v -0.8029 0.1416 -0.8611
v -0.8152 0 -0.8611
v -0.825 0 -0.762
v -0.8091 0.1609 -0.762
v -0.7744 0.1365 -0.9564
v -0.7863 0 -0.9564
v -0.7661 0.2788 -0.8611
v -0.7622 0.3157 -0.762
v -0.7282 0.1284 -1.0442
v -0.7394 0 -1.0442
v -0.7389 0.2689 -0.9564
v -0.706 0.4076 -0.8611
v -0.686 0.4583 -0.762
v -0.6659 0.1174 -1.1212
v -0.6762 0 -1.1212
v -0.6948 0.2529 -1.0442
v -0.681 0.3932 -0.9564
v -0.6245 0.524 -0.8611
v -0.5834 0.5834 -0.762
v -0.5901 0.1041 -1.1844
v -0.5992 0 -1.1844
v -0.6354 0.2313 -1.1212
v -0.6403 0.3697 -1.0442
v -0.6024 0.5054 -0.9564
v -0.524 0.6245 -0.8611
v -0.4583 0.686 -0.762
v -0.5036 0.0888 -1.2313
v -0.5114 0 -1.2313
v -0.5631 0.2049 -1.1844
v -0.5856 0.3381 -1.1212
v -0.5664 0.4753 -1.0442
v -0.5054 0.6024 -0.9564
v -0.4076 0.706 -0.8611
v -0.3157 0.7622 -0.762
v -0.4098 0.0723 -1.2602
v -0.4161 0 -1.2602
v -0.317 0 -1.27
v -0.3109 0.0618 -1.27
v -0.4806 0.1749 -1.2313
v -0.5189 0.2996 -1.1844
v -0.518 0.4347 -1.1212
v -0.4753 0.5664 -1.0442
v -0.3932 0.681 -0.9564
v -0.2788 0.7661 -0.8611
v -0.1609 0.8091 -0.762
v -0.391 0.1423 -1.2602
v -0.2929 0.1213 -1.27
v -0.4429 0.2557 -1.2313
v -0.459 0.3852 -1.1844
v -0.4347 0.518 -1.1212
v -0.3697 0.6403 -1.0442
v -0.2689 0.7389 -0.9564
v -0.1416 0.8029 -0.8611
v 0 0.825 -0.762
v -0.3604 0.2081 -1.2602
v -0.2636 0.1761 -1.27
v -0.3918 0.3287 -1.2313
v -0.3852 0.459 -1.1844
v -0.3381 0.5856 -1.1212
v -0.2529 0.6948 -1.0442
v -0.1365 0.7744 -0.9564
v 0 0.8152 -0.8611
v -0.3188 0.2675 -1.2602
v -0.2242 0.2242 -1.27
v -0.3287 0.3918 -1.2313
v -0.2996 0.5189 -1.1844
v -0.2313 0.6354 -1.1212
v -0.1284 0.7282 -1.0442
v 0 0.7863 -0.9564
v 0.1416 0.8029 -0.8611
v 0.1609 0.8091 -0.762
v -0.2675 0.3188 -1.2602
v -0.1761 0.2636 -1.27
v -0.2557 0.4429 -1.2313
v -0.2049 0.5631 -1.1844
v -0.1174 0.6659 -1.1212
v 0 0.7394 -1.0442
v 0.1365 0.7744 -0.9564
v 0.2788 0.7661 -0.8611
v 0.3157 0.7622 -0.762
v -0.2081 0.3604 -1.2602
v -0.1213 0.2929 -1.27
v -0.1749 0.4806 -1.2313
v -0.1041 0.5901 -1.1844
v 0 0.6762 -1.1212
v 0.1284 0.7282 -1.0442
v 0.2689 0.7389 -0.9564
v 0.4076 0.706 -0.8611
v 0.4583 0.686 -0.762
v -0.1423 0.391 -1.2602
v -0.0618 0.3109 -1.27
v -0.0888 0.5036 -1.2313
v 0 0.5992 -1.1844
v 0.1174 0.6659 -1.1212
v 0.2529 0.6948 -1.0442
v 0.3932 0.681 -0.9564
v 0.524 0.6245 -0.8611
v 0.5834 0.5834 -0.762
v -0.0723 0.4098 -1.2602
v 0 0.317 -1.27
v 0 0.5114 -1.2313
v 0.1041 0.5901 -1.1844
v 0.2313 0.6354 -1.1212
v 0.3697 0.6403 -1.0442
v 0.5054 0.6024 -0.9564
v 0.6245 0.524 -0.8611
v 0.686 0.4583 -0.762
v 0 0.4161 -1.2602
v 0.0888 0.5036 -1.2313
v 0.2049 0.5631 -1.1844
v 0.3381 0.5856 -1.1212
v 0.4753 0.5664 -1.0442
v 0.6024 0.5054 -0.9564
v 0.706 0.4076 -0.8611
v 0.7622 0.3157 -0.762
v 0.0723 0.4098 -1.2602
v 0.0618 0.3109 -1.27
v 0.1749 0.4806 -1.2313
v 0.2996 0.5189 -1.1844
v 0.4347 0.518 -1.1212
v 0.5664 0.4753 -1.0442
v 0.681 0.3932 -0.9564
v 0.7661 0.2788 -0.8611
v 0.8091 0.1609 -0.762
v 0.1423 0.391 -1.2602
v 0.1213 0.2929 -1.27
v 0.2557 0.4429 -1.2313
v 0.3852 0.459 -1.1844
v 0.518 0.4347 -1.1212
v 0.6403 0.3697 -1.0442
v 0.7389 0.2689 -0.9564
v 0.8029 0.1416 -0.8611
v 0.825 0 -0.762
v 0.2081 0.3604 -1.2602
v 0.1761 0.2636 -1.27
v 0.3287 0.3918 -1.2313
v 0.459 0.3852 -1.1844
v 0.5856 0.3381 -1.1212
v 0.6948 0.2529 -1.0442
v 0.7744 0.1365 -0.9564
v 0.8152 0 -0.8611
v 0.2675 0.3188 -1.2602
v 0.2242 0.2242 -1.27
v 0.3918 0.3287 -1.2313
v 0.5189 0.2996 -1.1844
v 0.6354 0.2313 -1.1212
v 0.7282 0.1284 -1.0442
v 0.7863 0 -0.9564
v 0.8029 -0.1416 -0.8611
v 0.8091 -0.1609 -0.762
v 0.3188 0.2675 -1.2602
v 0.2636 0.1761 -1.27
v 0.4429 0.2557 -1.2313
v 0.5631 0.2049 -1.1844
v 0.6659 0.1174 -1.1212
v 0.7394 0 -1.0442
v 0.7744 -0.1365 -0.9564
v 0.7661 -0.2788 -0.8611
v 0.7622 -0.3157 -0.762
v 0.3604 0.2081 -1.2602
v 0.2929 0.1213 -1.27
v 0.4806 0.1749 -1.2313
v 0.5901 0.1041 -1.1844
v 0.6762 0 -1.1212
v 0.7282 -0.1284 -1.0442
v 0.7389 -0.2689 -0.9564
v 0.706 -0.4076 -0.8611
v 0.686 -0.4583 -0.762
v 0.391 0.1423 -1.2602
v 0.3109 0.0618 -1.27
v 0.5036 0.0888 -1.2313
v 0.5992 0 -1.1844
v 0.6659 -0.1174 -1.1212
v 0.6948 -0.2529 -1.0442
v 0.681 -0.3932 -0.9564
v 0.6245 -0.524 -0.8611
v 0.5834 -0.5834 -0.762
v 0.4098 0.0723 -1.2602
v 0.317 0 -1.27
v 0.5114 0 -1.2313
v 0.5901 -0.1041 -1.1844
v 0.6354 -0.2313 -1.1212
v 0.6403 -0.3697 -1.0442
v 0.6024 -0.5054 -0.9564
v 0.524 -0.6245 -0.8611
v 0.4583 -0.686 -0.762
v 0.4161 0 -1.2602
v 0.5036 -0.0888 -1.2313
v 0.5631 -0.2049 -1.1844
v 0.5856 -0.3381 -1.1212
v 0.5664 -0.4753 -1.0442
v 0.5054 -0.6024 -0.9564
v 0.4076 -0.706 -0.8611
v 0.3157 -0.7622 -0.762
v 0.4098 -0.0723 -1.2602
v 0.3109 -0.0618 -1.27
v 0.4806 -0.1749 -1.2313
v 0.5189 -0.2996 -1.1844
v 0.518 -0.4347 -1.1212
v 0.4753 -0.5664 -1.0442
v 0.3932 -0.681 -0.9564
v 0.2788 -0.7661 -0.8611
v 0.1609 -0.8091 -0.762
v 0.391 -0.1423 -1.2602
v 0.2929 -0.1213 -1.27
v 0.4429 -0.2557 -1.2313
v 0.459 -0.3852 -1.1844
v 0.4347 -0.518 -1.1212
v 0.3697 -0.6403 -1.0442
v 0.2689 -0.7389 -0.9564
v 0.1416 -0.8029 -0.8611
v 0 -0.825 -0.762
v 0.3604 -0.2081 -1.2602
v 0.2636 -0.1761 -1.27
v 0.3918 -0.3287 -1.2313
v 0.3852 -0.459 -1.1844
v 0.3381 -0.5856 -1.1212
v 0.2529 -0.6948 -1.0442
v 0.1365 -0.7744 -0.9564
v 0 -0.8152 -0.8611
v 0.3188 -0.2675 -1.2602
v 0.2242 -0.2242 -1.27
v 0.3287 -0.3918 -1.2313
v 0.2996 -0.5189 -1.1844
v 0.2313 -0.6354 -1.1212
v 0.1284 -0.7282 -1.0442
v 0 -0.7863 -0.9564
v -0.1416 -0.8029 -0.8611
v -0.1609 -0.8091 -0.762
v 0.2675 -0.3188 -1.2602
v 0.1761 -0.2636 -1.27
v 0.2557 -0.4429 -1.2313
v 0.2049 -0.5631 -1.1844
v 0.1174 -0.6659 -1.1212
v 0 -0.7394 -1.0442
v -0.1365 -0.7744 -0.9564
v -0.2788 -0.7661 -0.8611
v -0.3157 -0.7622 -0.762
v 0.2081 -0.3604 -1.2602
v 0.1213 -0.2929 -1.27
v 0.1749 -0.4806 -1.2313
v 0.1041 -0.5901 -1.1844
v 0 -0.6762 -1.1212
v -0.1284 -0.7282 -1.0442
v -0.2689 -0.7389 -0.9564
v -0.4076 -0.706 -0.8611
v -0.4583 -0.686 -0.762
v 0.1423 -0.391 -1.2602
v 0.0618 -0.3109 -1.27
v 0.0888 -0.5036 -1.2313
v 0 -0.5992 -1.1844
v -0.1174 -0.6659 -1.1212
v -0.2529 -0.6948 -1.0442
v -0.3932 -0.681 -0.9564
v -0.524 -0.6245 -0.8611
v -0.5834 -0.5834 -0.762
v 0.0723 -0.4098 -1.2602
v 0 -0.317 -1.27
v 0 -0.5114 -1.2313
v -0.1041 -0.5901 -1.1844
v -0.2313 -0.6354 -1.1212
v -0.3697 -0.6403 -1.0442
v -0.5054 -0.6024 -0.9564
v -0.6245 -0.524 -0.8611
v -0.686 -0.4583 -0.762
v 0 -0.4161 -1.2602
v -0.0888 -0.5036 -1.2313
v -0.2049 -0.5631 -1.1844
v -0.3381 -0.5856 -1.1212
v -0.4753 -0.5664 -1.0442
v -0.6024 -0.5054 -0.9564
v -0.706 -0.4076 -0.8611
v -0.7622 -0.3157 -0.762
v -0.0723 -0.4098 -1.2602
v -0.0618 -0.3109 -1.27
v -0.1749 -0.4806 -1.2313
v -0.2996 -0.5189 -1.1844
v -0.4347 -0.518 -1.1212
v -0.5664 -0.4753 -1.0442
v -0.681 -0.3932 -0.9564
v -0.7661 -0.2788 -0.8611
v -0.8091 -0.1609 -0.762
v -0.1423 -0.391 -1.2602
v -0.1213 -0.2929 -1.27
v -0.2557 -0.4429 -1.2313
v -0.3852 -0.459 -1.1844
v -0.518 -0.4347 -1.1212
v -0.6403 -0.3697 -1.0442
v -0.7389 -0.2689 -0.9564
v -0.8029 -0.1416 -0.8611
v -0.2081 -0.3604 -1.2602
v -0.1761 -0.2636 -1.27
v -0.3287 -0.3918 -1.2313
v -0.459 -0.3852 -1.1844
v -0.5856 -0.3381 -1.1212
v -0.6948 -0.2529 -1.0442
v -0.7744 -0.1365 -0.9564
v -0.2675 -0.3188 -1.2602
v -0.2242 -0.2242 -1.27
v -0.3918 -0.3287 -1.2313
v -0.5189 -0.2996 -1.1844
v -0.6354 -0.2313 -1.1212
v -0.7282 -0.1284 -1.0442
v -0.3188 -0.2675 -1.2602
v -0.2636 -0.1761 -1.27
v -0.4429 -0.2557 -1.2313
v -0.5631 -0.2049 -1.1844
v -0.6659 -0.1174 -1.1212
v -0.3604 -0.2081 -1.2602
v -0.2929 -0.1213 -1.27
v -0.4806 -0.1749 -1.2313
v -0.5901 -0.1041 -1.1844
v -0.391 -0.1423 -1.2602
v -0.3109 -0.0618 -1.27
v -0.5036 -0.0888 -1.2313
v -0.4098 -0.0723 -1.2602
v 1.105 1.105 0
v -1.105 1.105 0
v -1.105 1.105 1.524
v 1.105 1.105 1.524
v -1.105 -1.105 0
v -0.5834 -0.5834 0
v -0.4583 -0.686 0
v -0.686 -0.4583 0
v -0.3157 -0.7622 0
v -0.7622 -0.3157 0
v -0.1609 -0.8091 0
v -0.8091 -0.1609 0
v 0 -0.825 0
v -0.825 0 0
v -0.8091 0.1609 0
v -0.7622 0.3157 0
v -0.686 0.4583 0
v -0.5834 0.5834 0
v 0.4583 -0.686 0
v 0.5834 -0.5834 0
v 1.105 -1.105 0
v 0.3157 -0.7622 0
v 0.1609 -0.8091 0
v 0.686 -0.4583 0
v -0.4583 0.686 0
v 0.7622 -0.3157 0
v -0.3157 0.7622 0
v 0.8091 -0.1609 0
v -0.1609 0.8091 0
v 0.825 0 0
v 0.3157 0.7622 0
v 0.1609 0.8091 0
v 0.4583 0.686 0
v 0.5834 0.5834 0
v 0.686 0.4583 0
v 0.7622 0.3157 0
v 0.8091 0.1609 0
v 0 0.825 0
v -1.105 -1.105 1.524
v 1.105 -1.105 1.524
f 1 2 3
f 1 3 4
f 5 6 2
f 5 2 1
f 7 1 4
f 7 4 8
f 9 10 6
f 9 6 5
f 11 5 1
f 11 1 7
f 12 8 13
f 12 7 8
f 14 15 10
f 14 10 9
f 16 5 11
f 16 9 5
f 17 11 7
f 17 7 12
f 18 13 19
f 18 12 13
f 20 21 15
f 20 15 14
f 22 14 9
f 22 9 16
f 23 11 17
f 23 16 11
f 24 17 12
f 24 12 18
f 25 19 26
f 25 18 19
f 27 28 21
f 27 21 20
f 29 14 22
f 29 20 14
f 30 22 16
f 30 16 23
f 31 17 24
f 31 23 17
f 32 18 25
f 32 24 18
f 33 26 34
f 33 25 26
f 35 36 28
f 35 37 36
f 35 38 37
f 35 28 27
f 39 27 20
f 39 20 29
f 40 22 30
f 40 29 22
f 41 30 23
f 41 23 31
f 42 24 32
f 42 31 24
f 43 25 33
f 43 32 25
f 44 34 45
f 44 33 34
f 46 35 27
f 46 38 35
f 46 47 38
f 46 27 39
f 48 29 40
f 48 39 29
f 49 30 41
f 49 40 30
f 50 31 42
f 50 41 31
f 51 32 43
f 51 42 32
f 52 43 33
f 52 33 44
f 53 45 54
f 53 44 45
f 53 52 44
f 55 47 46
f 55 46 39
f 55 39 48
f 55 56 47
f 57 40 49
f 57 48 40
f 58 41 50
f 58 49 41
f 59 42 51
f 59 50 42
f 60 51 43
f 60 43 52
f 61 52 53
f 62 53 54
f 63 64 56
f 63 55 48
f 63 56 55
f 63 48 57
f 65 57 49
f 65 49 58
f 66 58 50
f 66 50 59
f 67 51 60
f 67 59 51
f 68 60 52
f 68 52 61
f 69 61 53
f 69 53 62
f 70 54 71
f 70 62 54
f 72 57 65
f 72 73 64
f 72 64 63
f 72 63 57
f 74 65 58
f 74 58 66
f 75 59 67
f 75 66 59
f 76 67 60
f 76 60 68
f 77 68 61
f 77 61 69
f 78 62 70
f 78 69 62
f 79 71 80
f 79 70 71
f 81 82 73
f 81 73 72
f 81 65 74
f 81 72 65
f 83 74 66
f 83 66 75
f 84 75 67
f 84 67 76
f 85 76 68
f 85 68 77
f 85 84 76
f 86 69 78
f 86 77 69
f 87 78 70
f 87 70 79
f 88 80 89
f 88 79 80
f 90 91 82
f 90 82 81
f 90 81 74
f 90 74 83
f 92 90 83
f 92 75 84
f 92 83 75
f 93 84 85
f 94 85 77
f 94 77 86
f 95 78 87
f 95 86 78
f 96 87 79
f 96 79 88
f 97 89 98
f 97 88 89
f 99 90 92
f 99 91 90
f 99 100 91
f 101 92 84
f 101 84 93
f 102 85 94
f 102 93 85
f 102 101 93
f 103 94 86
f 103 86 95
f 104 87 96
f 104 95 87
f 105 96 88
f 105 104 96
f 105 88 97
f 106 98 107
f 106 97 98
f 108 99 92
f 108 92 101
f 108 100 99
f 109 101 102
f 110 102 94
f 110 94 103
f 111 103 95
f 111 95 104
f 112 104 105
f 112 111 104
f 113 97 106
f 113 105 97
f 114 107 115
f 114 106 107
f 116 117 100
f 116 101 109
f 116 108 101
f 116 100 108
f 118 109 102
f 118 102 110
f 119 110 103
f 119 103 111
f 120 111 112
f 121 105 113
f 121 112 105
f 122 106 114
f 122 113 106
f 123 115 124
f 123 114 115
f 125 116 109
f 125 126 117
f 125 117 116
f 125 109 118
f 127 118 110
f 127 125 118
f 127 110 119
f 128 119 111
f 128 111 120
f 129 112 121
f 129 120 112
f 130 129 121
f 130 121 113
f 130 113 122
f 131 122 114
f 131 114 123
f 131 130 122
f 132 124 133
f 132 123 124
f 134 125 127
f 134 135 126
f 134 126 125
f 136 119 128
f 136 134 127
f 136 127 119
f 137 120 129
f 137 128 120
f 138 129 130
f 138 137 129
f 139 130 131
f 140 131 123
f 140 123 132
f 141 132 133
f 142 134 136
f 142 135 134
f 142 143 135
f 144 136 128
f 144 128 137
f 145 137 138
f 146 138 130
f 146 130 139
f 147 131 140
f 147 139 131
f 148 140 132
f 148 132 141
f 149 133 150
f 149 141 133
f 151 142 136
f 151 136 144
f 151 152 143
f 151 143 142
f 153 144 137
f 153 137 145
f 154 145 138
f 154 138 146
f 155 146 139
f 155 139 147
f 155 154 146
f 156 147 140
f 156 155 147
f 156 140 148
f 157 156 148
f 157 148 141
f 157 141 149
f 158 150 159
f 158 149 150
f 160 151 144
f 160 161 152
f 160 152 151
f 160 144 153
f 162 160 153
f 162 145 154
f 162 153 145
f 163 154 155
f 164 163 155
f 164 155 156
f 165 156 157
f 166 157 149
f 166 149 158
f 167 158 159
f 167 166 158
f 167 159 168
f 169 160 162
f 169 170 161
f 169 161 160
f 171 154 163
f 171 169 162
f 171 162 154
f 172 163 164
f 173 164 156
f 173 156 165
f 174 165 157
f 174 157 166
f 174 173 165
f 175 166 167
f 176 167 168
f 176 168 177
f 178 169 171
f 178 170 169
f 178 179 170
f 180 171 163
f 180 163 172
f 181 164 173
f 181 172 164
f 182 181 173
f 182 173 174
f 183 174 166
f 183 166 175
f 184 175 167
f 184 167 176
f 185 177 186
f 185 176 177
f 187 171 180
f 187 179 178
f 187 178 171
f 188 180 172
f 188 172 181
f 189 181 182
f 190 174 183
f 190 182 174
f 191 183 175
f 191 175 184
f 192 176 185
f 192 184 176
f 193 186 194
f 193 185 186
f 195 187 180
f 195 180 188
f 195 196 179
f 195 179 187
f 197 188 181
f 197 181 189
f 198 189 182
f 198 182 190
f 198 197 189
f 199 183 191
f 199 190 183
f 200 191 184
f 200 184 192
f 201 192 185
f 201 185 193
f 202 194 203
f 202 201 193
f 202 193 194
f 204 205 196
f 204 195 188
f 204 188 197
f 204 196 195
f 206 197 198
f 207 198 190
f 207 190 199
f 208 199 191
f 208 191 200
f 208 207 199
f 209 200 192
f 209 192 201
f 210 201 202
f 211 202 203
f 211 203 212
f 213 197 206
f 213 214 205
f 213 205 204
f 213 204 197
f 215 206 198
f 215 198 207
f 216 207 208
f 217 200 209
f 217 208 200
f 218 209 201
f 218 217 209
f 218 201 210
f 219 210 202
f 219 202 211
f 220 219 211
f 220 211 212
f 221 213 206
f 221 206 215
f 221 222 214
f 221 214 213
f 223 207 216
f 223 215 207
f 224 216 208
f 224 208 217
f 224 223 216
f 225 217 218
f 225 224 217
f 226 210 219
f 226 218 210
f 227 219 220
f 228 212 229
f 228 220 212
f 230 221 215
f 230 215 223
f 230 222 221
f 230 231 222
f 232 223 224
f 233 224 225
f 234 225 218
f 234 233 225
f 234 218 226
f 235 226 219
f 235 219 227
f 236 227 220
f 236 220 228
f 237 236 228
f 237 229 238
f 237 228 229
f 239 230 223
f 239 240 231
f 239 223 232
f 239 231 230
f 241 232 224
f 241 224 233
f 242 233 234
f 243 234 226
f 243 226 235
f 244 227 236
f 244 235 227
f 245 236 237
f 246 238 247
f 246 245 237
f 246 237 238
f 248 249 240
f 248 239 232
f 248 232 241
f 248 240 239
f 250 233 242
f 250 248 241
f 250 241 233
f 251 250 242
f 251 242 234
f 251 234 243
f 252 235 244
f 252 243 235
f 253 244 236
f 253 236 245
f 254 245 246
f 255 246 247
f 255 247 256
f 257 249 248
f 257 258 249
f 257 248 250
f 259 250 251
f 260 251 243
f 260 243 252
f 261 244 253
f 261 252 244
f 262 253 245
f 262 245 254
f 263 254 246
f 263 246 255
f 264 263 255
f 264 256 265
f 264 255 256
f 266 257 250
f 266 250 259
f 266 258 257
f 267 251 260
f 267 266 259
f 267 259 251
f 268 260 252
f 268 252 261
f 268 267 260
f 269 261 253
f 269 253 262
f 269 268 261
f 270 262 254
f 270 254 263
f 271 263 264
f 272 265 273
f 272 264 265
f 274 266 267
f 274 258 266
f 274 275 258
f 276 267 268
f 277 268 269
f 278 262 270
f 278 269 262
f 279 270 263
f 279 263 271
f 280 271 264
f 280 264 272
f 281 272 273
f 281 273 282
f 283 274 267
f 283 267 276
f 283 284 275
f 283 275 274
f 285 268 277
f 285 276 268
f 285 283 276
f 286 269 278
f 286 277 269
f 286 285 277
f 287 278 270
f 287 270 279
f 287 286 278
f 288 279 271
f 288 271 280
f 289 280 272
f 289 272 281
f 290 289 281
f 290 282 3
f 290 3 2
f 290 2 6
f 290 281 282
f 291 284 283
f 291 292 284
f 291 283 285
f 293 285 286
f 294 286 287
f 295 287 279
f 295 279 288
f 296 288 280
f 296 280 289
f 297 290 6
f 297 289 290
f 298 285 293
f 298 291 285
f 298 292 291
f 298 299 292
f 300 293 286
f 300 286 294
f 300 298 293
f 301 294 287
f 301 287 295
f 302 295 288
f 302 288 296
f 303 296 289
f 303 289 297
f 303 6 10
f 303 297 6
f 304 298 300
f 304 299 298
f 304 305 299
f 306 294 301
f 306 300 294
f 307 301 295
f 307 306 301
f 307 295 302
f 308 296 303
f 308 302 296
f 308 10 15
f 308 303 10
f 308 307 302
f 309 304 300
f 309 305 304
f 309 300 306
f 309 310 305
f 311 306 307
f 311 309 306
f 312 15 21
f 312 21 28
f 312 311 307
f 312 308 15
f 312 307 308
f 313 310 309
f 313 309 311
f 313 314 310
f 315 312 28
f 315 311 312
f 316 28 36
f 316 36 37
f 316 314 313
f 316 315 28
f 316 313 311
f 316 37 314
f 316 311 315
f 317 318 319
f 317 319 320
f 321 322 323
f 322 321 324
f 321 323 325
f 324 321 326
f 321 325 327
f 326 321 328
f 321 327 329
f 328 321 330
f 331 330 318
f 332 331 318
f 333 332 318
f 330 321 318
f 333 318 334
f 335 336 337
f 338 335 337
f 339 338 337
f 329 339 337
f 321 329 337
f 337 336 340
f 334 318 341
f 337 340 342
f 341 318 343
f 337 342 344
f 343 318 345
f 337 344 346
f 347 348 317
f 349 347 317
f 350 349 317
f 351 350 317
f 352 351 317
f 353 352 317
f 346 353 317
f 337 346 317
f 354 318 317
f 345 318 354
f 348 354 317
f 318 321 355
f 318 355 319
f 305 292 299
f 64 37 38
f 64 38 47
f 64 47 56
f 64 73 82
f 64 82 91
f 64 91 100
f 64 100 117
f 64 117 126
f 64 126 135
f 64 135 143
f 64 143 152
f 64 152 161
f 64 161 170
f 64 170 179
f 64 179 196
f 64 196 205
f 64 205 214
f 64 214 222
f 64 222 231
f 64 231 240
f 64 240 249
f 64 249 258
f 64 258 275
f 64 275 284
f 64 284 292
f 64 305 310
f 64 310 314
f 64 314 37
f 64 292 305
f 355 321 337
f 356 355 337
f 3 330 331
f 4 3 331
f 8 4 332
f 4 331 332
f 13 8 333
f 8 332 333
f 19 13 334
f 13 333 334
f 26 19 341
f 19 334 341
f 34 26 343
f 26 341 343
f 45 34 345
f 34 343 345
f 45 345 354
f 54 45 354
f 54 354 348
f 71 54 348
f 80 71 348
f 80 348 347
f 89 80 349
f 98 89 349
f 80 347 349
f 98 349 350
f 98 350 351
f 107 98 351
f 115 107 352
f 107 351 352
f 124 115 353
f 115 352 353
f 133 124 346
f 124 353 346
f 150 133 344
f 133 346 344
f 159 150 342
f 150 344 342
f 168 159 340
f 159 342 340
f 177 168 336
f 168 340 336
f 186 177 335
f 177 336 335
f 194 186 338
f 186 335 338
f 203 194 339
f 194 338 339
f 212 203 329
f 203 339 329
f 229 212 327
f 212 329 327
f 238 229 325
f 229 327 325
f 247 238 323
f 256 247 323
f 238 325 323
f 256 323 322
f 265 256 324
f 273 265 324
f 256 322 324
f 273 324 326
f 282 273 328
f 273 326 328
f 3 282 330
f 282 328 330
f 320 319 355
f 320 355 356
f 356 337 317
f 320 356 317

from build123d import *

# Parameters (mm, degrees)
SKETCH1_W           = 2.21
SKETCH1_H           = 2.21
BOSS_EXTRUDE1_DEPTH = 1.524
SKETCH2_R           = 0.825
BOSS_EXTRUDE2_DEPTH = 1.27
FILLET1_R           = 0.508


with BuildPart() as part:
    # Sketch1 → Boss-Extrude1 (new body)
    with BuildSketch(Plane.XY):
        Rectangle(SKETCH1_W, SKETCH1_H)
    extrude(amount=BOSS_EXTRUDE1_DEPTH)

    # Sketch2 → Boss-Extrude2 (add)
    with BuildSketch(Plane(origin=(0, 0, 0), x_dir=(-1, 0, 0), z_dir=(0, 0, -1))):
        Circle(SKETCH2_R)
    extrude(amount=BOSS_EXTRUDE2_DEPTH)

    # Fillet1
    fillet1_edges = [part.edges().sort_by_distance(p)[0] for p in [
        (0.825, 0, -1.27),
    ]]
    fillet(fillet1_edges, radius=FILLET1_R)


solid = part.part
